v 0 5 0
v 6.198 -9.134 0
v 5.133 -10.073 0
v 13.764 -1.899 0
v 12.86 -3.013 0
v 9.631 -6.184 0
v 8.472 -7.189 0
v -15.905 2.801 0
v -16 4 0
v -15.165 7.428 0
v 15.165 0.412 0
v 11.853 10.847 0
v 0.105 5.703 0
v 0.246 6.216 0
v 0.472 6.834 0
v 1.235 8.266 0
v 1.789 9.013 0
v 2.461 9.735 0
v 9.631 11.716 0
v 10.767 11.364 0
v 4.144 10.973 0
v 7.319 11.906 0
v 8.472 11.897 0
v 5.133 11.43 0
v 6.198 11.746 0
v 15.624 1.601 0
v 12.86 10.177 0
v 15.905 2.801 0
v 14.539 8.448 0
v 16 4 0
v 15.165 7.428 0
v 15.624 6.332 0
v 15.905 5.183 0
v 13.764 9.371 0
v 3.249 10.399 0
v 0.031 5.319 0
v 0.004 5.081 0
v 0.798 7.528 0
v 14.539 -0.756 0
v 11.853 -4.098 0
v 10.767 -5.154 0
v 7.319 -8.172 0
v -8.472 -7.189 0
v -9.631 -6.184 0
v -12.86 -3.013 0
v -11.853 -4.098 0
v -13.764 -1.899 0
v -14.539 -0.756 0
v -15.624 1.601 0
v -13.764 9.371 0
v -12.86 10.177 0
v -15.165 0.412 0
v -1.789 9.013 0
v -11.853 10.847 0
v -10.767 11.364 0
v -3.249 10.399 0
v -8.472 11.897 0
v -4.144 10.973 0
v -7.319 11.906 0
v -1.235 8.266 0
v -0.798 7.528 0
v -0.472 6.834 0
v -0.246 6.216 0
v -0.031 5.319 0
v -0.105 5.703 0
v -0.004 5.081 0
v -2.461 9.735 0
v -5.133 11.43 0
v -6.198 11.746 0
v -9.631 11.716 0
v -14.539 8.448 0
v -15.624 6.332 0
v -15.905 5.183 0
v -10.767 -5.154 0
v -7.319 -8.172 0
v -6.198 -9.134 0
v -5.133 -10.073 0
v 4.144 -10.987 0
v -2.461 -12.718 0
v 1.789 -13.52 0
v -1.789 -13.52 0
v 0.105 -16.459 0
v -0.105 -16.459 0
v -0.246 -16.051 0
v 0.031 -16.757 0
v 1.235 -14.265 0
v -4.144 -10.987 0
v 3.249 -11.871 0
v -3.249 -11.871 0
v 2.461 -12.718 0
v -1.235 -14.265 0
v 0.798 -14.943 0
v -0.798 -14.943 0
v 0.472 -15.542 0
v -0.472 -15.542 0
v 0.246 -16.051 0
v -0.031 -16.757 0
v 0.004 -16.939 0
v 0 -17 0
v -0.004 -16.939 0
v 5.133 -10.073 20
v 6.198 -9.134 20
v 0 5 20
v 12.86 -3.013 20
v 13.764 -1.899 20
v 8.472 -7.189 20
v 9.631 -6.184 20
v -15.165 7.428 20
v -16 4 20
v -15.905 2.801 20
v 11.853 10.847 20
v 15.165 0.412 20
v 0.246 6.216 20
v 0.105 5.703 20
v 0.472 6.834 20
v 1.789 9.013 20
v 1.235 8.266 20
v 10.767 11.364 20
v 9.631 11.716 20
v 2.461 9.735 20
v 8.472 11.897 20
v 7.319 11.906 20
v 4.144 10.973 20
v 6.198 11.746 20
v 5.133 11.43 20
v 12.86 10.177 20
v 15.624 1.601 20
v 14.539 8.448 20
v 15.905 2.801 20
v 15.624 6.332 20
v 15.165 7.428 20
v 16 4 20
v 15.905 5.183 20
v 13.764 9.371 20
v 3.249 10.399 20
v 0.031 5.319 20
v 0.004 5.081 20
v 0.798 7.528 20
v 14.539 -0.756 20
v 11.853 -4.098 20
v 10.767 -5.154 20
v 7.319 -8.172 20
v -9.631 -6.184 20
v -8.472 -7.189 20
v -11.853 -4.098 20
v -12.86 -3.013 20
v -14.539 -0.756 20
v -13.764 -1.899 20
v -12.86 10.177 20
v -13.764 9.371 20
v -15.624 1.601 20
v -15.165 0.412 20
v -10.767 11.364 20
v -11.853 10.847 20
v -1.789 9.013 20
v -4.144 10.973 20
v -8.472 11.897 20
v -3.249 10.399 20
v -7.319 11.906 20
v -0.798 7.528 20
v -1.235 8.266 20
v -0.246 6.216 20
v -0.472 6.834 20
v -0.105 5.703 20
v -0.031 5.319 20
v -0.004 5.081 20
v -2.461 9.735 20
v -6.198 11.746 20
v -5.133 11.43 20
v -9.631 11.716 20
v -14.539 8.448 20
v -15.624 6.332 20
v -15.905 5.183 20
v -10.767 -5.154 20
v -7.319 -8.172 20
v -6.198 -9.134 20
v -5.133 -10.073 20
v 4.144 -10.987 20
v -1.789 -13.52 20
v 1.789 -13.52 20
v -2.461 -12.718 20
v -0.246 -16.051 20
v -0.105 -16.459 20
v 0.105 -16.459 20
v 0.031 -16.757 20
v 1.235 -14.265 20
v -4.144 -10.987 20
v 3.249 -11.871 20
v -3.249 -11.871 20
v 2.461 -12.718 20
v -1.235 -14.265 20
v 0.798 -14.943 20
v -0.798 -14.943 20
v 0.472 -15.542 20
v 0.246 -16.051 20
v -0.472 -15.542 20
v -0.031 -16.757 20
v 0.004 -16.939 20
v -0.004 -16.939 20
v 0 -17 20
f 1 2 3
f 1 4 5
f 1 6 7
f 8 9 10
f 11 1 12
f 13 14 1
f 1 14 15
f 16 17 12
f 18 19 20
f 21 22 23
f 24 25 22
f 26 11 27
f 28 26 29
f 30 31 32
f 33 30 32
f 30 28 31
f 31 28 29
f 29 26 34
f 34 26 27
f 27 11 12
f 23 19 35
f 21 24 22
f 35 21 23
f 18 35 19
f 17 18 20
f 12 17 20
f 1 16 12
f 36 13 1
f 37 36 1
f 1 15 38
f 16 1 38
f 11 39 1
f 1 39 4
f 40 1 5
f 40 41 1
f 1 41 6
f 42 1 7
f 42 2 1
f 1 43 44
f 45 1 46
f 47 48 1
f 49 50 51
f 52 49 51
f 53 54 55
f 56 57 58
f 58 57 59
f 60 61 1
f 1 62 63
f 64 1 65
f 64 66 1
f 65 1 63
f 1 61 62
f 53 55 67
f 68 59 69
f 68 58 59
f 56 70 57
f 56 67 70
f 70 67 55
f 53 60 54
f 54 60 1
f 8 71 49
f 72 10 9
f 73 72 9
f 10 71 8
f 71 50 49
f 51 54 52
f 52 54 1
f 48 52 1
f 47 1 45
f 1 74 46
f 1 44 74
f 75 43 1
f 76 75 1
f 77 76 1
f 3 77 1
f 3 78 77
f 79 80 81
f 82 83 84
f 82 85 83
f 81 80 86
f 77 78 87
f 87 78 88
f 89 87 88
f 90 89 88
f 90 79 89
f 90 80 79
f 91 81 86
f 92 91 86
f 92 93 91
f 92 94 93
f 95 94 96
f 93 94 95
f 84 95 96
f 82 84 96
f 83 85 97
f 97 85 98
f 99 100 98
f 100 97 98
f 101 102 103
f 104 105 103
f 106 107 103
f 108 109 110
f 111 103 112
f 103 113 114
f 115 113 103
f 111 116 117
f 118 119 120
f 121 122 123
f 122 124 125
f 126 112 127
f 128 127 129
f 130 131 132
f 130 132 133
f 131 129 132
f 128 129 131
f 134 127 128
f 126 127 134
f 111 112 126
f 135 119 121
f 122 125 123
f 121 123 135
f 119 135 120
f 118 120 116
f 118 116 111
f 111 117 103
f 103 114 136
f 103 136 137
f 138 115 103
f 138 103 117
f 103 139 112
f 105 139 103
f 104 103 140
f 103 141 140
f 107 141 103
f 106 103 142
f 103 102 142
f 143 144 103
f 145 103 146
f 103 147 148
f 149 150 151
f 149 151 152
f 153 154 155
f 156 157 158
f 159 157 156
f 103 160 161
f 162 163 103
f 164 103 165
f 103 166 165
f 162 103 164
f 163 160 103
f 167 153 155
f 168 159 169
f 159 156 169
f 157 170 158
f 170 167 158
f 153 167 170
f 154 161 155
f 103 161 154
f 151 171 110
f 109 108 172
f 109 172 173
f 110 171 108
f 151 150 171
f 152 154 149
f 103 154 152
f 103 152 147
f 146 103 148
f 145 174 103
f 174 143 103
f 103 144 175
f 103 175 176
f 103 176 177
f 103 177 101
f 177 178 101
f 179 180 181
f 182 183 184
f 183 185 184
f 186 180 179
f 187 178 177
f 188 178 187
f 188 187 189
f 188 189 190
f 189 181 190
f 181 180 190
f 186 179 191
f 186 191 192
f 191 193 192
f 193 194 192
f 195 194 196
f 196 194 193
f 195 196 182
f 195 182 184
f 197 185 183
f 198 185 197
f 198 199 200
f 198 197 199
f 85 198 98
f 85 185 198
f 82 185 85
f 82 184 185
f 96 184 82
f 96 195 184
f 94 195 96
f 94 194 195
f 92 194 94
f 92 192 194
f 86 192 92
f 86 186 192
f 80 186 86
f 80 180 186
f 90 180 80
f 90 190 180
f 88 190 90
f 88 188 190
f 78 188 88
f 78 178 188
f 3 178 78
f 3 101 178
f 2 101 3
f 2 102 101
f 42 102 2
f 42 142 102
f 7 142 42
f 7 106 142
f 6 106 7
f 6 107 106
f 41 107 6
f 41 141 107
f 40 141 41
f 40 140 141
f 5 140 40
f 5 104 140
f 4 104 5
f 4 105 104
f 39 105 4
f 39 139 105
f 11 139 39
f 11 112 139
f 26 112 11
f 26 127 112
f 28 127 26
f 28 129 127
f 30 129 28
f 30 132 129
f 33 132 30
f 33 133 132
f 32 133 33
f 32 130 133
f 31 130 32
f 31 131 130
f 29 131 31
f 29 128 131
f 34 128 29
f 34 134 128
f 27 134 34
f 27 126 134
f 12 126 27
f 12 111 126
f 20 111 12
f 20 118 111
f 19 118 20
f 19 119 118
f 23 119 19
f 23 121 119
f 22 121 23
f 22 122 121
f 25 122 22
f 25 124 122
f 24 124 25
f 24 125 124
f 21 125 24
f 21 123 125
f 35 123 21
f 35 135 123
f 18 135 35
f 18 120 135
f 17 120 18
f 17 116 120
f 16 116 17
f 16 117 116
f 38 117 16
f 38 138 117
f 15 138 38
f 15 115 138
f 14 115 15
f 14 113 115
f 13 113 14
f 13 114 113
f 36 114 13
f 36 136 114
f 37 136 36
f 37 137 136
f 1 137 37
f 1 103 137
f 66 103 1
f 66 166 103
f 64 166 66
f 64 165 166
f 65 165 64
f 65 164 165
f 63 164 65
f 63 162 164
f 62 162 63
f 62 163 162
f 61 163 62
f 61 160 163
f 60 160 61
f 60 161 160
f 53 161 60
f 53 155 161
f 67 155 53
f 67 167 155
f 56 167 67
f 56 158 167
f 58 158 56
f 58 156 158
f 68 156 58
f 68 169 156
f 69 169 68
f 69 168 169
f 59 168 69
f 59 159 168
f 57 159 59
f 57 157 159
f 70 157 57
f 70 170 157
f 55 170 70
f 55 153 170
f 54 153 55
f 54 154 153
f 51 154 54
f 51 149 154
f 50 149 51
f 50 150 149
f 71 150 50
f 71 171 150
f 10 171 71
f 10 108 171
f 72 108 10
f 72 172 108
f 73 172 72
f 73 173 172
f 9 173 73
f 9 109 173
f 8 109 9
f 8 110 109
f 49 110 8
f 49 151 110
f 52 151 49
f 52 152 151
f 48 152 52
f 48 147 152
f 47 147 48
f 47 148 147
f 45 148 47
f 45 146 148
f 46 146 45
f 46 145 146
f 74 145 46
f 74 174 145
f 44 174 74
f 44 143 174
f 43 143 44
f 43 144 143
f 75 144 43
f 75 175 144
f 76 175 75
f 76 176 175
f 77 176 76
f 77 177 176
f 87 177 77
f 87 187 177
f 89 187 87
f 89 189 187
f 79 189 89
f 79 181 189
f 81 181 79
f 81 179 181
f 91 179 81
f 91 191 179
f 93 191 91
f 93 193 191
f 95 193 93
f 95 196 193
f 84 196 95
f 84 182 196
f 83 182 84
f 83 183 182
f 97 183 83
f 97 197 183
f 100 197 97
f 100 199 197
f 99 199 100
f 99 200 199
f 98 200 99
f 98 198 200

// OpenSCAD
// Heart

// x: 16 * pow(sin(t), 3)
// y: 13 * cos(t) - 5 * cos(2*t) - 2 * cos(3*t) - cos(4*t)

function heart_coordinates(t) = [16 * pow(sin(t), 3), 13 * cos(t) - 5 * cos(2*t) - 2 * cos(3*t) - cos(4*t)];

n = 100;
step = 360/n;
h = 20;

function heart_points(n=50) = [ for (t=[0:step:359.999]) heart_coordinates(t) ]; 

module heart(h=10, n=50) {
points = heart_points(n=n);
    
linear_extrude(height=h)
    polygon(points);
}

heart(h=20);
